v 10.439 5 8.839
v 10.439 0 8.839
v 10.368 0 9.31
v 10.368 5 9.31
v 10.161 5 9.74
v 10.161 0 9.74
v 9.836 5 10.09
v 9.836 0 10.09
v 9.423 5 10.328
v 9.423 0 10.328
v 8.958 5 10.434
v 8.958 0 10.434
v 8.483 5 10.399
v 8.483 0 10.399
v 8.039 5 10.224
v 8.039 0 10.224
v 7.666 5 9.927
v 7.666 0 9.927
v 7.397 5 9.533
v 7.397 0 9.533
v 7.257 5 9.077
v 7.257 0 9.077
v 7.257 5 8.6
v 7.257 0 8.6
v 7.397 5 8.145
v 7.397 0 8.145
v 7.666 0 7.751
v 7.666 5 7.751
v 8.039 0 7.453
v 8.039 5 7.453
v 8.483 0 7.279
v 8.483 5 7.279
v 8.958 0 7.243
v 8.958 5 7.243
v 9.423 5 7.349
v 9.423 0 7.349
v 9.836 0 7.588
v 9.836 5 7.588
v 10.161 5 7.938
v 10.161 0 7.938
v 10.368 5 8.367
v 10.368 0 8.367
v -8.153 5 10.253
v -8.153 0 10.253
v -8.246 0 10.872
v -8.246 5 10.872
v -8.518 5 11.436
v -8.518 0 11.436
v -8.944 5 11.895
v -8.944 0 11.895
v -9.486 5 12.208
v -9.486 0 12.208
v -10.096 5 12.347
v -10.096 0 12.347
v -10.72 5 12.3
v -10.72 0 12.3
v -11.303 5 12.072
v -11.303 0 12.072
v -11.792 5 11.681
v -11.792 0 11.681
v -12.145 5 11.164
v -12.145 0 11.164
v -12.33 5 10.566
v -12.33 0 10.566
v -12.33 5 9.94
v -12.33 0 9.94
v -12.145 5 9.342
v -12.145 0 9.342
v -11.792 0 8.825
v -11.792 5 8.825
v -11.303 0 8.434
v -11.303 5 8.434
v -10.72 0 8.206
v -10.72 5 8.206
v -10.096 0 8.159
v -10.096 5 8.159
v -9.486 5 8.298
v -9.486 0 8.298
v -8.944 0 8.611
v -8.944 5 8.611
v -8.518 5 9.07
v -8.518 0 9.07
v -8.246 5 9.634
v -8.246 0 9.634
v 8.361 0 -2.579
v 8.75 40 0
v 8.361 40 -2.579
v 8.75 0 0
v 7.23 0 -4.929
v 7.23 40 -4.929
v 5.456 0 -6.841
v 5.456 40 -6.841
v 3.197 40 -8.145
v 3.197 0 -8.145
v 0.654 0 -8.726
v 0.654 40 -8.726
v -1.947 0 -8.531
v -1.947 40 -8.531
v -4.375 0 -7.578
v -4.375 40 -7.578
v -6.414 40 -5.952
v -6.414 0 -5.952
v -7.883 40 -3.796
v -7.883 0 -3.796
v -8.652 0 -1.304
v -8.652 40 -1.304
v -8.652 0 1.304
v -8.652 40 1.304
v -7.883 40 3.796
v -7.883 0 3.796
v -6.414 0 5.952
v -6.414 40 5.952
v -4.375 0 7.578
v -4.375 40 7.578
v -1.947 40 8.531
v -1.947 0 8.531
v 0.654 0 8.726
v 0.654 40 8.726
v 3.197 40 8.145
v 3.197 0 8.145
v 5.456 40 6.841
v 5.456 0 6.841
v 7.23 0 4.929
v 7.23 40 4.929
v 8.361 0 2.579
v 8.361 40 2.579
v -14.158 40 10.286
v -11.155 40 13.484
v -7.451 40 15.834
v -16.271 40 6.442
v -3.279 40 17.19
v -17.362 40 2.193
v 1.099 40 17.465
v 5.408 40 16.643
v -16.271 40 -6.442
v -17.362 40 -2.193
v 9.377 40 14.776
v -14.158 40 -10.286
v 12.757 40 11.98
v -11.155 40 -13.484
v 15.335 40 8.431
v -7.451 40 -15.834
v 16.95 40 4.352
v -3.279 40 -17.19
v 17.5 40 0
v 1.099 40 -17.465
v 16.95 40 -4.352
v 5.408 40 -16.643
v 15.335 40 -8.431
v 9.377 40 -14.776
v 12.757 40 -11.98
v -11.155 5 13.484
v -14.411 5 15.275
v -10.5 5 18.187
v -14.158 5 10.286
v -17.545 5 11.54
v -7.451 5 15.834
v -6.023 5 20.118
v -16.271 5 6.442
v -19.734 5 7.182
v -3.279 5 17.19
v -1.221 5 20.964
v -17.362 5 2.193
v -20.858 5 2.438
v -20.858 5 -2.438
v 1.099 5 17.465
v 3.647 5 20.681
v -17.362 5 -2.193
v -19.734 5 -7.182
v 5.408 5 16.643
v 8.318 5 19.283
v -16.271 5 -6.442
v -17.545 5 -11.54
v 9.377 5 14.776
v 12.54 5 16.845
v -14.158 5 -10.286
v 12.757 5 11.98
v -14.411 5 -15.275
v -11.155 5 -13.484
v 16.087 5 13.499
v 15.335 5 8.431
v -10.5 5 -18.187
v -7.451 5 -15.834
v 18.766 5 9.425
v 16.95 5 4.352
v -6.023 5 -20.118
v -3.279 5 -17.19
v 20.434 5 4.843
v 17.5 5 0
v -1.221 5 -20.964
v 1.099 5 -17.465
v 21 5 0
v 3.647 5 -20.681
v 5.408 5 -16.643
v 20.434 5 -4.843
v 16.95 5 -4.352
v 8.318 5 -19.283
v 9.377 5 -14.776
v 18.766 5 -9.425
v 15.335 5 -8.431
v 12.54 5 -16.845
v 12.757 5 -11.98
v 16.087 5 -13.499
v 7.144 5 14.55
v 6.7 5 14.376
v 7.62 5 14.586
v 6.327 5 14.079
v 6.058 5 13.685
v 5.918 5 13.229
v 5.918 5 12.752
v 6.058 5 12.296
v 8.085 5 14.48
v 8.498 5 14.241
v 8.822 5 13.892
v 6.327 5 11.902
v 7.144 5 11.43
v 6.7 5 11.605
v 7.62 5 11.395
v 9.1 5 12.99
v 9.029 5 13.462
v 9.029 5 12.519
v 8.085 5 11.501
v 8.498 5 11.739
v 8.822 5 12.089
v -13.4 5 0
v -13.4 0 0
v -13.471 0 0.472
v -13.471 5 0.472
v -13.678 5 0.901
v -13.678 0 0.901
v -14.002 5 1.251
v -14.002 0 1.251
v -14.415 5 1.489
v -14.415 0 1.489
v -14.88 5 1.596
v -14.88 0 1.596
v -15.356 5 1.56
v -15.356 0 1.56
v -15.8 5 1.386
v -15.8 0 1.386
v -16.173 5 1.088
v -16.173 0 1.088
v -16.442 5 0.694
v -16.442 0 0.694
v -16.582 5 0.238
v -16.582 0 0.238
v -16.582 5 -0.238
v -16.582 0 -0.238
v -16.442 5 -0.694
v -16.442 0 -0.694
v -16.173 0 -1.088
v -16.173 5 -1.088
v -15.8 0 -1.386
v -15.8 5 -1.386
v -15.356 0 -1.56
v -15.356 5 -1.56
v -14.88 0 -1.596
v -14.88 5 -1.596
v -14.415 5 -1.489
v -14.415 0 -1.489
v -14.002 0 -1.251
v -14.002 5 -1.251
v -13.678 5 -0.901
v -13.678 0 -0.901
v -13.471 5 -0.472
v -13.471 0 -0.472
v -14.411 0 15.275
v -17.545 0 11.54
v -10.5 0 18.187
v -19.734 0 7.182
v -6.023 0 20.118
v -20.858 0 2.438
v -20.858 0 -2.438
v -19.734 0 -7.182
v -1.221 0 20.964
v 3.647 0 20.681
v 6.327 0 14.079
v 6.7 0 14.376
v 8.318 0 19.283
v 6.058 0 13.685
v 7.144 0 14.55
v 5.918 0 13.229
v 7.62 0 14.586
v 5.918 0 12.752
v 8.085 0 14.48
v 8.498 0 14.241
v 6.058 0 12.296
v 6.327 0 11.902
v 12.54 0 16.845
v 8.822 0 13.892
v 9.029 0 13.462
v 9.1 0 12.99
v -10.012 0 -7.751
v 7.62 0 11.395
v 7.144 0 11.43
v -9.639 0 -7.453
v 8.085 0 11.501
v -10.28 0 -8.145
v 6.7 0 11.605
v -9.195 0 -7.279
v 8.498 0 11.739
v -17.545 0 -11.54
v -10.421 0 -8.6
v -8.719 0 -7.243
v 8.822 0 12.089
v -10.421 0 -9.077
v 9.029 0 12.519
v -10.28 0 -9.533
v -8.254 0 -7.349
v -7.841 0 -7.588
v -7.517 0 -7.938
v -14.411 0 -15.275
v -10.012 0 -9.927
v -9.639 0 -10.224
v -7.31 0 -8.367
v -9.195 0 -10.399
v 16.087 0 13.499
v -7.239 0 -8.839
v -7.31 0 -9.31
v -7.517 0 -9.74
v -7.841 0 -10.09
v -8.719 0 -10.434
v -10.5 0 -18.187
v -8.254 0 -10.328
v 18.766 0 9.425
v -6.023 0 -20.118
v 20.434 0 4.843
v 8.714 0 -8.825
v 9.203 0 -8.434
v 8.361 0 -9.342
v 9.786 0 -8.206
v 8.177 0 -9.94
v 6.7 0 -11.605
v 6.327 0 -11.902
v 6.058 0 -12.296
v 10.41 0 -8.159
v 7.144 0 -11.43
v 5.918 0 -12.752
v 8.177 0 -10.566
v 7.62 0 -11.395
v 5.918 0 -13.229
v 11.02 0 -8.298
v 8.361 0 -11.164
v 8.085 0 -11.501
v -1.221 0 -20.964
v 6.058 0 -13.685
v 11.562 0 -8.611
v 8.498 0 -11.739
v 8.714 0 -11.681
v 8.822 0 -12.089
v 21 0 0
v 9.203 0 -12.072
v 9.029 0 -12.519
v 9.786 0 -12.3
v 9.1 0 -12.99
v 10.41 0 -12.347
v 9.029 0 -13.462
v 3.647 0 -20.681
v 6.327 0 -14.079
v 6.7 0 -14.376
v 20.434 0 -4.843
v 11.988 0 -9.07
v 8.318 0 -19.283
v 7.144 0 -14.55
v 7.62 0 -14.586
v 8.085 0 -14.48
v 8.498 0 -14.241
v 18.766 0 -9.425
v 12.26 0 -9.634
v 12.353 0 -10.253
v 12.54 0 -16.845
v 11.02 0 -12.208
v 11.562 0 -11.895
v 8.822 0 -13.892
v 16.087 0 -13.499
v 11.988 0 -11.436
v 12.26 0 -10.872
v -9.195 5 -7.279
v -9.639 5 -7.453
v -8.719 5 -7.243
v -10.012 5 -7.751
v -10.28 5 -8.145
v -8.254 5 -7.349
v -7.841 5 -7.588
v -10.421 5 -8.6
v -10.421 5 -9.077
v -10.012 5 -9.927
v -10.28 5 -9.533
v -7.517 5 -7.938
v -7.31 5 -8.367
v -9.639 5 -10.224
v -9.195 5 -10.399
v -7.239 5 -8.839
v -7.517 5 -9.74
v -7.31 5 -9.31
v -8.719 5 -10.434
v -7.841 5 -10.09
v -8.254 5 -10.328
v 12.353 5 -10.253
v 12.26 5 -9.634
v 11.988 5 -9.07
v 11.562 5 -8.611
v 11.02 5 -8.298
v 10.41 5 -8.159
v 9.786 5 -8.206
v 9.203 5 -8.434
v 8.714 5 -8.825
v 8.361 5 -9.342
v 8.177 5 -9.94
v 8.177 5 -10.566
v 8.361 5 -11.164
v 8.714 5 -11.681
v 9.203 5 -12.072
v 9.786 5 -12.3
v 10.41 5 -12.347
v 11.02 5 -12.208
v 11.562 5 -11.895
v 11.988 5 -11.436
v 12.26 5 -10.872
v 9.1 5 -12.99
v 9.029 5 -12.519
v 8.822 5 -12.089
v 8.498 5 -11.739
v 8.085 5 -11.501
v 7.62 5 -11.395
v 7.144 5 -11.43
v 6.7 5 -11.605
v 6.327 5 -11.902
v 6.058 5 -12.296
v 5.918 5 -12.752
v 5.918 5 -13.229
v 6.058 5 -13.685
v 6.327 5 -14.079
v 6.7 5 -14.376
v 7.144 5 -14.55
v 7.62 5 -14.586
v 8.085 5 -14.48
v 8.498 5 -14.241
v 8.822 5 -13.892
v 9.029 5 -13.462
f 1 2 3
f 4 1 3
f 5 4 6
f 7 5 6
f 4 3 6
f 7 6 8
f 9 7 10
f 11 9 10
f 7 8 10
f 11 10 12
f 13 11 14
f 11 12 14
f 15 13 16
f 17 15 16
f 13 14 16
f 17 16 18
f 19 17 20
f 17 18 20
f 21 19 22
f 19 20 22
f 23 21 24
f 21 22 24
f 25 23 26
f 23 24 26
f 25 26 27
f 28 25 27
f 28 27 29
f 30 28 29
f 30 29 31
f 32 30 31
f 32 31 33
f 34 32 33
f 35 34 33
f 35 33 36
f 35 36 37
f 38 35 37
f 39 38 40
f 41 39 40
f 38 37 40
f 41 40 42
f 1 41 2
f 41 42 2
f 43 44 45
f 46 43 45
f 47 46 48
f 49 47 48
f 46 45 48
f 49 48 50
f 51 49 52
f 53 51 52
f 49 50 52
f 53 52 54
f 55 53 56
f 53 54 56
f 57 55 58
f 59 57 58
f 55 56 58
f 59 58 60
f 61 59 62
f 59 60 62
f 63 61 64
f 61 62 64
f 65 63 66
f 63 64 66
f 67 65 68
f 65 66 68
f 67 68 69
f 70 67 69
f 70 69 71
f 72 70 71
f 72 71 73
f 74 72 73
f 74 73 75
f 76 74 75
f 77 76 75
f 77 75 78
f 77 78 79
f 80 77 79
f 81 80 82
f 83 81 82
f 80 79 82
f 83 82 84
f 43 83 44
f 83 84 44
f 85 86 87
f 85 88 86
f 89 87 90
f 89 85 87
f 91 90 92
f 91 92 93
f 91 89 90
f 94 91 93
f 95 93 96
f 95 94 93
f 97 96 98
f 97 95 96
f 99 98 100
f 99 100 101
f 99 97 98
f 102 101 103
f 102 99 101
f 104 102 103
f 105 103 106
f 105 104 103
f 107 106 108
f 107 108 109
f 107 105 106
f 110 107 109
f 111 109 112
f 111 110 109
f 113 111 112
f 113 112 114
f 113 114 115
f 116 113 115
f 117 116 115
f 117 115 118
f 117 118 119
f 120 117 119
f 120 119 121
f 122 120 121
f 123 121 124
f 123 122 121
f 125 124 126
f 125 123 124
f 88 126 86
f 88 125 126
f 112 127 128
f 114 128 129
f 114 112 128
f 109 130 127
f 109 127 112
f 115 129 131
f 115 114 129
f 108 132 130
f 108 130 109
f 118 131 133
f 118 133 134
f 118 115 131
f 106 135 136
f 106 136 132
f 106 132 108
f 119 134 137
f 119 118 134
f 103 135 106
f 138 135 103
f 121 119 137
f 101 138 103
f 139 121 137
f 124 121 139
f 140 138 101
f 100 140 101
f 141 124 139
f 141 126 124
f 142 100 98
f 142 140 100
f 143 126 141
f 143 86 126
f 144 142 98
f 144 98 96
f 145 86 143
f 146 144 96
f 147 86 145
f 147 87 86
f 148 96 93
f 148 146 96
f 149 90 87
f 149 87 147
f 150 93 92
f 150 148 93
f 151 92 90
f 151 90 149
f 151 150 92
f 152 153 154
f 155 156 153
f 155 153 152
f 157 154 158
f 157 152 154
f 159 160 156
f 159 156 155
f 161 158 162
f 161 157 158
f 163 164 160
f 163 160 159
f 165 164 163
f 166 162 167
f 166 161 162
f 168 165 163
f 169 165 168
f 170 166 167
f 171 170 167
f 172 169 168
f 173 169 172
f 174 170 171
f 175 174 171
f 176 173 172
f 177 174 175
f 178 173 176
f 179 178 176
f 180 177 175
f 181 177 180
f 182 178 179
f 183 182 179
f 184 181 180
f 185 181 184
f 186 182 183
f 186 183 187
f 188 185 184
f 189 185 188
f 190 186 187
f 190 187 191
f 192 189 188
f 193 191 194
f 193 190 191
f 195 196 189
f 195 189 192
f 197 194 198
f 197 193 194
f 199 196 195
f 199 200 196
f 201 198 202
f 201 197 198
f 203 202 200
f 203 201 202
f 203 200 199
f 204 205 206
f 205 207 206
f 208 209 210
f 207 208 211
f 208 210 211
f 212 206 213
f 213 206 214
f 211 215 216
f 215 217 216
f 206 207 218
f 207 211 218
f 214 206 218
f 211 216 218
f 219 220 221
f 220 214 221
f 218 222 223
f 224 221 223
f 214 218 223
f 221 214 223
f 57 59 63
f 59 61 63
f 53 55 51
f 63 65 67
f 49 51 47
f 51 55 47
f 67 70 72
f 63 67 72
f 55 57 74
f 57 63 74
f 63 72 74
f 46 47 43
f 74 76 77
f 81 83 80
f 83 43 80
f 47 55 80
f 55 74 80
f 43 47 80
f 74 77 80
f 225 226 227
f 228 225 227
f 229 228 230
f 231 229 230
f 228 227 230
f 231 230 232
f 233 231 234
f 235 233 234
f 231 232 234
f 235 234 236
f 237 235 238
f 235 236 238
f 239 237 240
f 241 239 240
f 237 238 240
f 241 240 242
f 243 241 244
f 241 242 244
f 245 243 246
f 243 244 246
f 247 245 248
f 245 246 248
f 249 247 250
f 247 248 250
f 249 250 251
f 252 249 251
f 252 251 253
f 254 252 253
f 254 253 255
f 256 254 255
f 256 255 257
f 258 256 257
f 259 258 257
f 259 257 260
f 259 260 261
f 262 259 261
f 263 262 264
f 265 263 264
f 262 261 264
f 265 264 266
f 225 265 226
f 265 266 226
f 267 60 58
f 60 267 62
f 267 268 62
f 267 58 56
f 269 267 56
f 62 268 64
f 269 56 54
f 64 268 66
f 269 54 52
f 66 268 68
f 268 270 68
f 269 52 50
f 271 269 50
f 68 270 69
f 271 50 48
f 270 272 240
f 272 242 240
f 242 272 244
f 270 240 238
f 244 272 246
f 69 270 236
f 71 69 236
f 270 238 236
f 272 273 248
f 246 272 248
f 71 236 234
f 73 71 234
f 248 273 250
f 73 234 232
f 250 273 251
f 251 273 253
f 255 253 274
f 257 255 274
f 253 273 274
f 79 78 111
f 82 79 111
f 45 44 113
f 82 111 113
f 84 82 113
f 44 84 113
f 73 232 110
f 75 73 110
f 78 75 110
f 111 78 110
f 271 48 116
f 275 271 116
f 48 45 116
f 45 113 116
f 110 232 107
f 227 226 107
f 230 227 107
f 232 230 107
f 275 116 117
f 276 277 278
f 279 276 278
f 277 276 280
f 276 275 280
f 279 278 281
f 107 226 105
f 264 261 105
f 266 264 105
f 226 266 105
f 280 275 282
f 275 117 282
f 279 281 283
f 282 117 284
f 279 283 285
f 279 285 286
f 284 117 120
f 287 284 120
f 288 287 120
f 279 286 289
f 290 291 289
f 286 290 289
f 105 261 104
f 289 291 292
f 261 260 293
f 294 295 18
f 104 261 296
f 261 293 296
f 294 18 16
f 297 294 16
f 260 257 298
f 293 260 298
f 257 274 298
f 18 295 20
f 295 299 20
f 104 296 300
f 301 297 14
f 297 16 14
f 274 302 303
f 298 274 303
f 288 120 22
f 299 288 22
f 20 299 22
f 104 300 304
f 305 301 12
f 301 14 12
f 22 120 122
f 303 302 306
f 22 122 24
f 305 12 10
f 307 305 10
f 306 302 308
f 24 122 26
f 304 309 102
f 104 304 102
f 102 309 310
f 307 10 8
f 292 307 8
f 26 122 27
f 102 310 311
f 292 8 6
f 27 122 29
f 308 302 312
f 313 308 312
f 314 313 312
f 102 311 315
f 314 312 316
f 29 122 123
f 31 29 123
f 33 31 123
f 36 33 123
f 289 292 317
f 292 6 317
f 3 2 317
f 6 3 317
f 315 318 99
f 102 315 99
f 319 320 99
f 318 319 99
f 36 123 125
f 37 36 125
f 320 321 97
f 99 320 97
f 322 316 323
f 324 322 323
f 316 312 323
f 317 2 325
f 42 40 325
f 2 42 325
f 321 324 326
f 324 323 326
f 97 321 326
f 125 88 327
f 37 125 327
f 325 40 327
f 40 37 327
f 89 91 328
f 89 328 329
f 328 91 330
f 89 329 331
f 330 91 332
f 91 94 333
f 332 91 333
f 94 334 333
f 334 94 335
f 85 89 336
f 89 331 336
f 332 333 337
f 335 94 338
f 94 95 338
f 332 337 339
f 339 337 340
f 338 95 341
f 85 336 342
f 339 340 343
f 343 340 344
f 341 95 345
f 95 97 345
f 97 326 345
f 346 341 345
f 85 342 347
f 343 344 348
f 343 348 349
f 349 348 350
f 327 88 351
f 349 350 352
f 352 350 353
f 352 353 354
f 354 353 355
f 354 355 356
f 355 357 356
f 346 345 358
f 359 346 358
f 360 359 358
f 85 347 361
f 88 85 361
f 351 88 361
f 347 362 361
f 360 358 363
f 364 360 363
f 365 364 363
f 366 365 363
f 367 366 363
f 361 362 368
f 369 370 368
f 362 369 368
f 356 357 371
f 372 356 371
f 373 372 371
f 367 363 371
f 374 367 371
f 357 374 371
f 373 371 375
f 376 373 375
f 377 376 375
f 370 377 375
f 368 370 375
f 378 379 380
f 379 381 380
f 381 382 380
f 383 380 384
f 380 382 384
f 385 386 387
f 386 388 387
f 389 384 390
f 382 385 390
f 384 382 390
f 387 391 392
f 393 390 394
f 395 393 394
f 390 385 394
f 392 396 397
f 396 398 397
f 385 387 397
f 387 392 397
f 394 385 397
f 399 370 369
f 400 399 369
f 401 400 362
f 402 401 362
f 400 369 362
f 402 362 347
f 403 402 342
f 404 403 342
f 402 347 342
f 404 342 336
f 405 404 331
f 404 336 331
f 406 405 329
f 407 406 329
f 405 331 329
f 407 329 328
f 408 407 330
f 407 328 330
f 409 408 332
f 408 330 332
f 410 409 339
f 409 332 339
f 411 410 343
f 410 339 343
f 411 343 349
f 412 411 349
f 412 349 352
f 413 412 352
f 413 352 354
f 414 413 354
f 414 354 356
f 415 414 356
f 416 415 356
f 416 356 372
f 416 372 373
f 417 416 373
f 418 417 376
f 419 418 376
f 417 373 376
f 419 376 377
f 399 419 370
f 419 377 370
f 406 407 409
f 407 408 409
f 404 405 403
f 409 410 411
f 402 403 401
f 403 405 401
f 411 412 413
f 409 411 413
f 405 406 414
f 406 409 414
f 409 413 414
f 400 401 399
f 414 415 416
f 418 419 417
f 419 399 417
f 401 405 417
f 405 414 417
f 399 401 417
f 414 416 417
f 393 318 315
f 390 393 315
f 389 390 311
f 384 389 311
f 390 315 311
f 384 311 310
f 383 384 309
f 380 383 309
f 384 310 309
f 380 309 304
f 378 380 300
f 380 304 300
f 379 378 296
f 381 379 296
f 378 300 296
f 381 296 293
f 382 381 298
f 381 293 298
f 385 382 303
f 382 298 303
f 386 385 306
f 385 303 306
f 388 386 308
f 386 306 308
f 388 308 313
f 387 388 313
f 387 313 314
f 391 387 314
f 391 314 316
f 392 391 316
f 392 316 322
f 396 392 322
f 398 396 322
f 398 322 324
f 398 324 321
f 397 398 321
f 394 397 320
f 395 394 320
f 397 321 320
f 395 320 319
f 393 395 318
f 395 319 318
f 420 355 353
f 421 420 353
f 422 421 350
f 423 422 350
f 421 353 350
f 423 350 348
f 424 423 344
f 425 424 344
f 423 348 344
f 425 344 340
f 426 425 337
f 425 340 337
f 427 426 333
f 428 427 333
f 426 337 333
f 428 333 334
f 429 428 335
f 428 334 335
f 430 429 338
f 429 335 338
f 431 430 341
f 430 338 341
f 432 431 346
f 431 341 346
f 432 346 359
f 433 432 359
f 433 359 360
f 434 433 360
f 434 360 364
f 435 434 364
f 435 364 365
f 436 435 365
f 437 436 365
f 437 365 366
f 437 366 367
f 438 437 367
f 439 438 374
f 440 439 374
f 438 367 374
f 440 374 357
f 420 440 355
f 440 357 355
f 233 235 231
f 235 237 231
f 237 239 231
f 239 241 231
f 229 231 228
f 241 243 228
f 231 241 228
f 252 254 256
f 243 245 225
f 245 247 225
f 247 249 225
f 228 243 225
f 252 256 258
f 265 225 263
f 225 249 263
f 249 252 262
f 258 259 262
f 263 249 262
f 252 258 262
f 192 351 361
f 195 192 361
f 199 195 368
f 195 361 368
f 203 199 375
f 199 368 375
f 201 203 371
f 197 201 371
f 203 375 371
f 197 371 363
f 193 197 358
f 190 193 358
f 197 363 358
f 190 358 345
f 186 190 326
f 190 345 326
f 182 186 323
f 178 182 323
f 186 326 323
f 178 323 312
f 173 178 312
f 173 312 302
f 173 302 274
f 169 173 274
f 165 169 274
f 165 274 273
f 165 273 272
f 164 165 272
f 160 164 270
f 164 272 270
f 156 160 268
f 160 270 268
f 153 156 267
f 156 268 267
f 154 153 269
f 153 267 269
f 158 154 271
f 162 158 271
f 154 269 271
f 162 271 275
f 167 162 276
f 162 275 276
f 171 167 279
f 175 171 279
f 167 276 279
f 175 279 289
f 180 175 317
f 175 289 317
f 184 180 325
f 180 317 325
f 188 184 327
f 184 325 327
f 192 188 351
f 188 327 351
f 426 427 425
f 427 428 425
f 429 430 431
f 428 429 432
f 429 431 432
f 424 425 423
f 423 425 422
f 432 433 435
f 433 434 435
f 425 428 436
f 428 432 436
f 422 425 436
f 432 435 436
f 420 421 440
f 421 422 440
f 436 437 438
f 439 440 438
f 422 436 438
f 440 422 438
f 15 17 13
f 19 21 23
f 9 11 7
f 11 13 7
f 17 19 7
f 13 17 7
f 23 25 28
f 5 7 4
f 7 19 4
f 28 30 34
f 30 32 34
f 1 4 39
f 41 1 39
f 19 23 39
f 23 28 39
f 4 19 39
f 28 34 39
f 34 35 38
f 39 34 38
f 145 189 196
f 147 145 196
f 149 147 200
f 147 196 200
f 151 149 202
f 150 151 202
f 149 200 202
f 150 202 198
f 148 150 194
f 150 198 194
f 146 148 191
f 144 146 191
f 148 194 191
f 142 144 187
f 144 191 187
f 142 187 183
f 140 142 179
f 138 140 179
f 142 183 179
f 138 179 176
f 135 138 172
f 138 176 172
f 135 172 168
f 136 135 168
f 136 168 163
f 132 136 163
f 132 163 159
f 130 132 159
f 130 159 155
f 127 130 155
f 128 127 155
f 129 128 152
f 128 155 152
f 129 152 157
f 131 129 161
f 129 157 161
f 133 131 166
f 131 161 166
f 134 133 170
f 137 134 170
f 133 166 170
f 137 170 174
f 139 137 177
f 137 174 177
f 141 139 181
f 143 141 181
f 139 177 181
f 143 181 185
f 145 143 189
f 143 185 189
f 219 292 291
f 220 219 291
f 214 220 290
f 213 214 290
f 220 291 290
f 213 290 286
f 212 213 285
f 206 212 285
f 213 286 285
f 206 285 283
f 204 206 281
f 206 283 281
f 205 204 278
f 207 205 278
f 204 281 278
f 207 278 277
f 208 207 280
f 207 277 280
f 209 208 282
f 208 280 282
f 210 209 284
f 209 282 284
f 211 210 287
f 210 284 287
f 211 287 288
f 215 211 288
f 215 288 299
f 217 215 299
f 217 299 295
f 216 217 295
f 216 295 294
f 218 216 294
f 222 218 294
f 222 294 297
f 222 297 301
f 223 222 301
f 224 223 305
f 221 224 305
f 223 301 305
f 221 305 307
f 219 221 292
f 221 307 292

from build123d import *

# Parameters (mm, degrees)
SKETCH1_R           = 21
SKETCH1_R_2         = 8.75
BOSS_EXTRUDE1_DEPTH = 5
SKETCH2_R           = 2.1
SKETCH2_R_2         = 1.6
CUT_EXTRUDE1_DEPTH  = 5
SKETCH3_R           = 17.5
SKETCH3_R_2         = 8.75
BOSS_EXTRUDE2_DEPTH = 35


with BuildPart() as part:
    # Sketch1 → Boss-Extrude1 (new body)
    with BuildSketch(Plane(origin=(0, 0, 0), x_dir=(1, 0, 0), z_dir=(0, 1, 0))):
        Circle(SKETCH1_R)
        Circle(SKETCH1_R_2, mode=Mode.SUBTRACT)
    extrude(amount=BOSS_EXTRUDE1_DEPTH)

    # Sketch2 → Cut-Extrude1 (cut)
    with BuildSketch(Plane.XZ):
        with Locations((-10.253048327, 10.253048327)):
            Circle(SKETCH2_R)
        with Locations((10.253048327, -10.253048327)):
            Circle(SKETCH2_R)
        with Locations((-15, 0)):
            Circle(SKETCH2_R_2)
        with Locations((7.5, 12.990381057)):
            Circle(SKETCH2_R_2)
        with Locations((7.5, -12.990381057)):
            Circle(SKETCH2_R_2)
        with Locations((8.838834765, 8.838834765)):
            Circle(SKETCH2_R_2)
        with Locations((-8.838834765, -8.838834765)):
            Circle(SKETCH2_R_2)
    extrude(amount=-CUT_EXTRUDE1_DEPTH, mode=Mode.SUBTRACT)

    # Sketch3 → Boss-Extrude2 (add)
    with BuildSketch(Plane(origin=(0, 5, 0), x_dir=(1, 0, 0), z_dir=(0, 1, 0))):
        Circle(SKETCH3_R)
        Circle(SKETCH3_R_2, mode=Mode.SUBTRACT)
    extrude(amount=BOSS_EXTRUDE2_DEPTH)


solid = part.part
